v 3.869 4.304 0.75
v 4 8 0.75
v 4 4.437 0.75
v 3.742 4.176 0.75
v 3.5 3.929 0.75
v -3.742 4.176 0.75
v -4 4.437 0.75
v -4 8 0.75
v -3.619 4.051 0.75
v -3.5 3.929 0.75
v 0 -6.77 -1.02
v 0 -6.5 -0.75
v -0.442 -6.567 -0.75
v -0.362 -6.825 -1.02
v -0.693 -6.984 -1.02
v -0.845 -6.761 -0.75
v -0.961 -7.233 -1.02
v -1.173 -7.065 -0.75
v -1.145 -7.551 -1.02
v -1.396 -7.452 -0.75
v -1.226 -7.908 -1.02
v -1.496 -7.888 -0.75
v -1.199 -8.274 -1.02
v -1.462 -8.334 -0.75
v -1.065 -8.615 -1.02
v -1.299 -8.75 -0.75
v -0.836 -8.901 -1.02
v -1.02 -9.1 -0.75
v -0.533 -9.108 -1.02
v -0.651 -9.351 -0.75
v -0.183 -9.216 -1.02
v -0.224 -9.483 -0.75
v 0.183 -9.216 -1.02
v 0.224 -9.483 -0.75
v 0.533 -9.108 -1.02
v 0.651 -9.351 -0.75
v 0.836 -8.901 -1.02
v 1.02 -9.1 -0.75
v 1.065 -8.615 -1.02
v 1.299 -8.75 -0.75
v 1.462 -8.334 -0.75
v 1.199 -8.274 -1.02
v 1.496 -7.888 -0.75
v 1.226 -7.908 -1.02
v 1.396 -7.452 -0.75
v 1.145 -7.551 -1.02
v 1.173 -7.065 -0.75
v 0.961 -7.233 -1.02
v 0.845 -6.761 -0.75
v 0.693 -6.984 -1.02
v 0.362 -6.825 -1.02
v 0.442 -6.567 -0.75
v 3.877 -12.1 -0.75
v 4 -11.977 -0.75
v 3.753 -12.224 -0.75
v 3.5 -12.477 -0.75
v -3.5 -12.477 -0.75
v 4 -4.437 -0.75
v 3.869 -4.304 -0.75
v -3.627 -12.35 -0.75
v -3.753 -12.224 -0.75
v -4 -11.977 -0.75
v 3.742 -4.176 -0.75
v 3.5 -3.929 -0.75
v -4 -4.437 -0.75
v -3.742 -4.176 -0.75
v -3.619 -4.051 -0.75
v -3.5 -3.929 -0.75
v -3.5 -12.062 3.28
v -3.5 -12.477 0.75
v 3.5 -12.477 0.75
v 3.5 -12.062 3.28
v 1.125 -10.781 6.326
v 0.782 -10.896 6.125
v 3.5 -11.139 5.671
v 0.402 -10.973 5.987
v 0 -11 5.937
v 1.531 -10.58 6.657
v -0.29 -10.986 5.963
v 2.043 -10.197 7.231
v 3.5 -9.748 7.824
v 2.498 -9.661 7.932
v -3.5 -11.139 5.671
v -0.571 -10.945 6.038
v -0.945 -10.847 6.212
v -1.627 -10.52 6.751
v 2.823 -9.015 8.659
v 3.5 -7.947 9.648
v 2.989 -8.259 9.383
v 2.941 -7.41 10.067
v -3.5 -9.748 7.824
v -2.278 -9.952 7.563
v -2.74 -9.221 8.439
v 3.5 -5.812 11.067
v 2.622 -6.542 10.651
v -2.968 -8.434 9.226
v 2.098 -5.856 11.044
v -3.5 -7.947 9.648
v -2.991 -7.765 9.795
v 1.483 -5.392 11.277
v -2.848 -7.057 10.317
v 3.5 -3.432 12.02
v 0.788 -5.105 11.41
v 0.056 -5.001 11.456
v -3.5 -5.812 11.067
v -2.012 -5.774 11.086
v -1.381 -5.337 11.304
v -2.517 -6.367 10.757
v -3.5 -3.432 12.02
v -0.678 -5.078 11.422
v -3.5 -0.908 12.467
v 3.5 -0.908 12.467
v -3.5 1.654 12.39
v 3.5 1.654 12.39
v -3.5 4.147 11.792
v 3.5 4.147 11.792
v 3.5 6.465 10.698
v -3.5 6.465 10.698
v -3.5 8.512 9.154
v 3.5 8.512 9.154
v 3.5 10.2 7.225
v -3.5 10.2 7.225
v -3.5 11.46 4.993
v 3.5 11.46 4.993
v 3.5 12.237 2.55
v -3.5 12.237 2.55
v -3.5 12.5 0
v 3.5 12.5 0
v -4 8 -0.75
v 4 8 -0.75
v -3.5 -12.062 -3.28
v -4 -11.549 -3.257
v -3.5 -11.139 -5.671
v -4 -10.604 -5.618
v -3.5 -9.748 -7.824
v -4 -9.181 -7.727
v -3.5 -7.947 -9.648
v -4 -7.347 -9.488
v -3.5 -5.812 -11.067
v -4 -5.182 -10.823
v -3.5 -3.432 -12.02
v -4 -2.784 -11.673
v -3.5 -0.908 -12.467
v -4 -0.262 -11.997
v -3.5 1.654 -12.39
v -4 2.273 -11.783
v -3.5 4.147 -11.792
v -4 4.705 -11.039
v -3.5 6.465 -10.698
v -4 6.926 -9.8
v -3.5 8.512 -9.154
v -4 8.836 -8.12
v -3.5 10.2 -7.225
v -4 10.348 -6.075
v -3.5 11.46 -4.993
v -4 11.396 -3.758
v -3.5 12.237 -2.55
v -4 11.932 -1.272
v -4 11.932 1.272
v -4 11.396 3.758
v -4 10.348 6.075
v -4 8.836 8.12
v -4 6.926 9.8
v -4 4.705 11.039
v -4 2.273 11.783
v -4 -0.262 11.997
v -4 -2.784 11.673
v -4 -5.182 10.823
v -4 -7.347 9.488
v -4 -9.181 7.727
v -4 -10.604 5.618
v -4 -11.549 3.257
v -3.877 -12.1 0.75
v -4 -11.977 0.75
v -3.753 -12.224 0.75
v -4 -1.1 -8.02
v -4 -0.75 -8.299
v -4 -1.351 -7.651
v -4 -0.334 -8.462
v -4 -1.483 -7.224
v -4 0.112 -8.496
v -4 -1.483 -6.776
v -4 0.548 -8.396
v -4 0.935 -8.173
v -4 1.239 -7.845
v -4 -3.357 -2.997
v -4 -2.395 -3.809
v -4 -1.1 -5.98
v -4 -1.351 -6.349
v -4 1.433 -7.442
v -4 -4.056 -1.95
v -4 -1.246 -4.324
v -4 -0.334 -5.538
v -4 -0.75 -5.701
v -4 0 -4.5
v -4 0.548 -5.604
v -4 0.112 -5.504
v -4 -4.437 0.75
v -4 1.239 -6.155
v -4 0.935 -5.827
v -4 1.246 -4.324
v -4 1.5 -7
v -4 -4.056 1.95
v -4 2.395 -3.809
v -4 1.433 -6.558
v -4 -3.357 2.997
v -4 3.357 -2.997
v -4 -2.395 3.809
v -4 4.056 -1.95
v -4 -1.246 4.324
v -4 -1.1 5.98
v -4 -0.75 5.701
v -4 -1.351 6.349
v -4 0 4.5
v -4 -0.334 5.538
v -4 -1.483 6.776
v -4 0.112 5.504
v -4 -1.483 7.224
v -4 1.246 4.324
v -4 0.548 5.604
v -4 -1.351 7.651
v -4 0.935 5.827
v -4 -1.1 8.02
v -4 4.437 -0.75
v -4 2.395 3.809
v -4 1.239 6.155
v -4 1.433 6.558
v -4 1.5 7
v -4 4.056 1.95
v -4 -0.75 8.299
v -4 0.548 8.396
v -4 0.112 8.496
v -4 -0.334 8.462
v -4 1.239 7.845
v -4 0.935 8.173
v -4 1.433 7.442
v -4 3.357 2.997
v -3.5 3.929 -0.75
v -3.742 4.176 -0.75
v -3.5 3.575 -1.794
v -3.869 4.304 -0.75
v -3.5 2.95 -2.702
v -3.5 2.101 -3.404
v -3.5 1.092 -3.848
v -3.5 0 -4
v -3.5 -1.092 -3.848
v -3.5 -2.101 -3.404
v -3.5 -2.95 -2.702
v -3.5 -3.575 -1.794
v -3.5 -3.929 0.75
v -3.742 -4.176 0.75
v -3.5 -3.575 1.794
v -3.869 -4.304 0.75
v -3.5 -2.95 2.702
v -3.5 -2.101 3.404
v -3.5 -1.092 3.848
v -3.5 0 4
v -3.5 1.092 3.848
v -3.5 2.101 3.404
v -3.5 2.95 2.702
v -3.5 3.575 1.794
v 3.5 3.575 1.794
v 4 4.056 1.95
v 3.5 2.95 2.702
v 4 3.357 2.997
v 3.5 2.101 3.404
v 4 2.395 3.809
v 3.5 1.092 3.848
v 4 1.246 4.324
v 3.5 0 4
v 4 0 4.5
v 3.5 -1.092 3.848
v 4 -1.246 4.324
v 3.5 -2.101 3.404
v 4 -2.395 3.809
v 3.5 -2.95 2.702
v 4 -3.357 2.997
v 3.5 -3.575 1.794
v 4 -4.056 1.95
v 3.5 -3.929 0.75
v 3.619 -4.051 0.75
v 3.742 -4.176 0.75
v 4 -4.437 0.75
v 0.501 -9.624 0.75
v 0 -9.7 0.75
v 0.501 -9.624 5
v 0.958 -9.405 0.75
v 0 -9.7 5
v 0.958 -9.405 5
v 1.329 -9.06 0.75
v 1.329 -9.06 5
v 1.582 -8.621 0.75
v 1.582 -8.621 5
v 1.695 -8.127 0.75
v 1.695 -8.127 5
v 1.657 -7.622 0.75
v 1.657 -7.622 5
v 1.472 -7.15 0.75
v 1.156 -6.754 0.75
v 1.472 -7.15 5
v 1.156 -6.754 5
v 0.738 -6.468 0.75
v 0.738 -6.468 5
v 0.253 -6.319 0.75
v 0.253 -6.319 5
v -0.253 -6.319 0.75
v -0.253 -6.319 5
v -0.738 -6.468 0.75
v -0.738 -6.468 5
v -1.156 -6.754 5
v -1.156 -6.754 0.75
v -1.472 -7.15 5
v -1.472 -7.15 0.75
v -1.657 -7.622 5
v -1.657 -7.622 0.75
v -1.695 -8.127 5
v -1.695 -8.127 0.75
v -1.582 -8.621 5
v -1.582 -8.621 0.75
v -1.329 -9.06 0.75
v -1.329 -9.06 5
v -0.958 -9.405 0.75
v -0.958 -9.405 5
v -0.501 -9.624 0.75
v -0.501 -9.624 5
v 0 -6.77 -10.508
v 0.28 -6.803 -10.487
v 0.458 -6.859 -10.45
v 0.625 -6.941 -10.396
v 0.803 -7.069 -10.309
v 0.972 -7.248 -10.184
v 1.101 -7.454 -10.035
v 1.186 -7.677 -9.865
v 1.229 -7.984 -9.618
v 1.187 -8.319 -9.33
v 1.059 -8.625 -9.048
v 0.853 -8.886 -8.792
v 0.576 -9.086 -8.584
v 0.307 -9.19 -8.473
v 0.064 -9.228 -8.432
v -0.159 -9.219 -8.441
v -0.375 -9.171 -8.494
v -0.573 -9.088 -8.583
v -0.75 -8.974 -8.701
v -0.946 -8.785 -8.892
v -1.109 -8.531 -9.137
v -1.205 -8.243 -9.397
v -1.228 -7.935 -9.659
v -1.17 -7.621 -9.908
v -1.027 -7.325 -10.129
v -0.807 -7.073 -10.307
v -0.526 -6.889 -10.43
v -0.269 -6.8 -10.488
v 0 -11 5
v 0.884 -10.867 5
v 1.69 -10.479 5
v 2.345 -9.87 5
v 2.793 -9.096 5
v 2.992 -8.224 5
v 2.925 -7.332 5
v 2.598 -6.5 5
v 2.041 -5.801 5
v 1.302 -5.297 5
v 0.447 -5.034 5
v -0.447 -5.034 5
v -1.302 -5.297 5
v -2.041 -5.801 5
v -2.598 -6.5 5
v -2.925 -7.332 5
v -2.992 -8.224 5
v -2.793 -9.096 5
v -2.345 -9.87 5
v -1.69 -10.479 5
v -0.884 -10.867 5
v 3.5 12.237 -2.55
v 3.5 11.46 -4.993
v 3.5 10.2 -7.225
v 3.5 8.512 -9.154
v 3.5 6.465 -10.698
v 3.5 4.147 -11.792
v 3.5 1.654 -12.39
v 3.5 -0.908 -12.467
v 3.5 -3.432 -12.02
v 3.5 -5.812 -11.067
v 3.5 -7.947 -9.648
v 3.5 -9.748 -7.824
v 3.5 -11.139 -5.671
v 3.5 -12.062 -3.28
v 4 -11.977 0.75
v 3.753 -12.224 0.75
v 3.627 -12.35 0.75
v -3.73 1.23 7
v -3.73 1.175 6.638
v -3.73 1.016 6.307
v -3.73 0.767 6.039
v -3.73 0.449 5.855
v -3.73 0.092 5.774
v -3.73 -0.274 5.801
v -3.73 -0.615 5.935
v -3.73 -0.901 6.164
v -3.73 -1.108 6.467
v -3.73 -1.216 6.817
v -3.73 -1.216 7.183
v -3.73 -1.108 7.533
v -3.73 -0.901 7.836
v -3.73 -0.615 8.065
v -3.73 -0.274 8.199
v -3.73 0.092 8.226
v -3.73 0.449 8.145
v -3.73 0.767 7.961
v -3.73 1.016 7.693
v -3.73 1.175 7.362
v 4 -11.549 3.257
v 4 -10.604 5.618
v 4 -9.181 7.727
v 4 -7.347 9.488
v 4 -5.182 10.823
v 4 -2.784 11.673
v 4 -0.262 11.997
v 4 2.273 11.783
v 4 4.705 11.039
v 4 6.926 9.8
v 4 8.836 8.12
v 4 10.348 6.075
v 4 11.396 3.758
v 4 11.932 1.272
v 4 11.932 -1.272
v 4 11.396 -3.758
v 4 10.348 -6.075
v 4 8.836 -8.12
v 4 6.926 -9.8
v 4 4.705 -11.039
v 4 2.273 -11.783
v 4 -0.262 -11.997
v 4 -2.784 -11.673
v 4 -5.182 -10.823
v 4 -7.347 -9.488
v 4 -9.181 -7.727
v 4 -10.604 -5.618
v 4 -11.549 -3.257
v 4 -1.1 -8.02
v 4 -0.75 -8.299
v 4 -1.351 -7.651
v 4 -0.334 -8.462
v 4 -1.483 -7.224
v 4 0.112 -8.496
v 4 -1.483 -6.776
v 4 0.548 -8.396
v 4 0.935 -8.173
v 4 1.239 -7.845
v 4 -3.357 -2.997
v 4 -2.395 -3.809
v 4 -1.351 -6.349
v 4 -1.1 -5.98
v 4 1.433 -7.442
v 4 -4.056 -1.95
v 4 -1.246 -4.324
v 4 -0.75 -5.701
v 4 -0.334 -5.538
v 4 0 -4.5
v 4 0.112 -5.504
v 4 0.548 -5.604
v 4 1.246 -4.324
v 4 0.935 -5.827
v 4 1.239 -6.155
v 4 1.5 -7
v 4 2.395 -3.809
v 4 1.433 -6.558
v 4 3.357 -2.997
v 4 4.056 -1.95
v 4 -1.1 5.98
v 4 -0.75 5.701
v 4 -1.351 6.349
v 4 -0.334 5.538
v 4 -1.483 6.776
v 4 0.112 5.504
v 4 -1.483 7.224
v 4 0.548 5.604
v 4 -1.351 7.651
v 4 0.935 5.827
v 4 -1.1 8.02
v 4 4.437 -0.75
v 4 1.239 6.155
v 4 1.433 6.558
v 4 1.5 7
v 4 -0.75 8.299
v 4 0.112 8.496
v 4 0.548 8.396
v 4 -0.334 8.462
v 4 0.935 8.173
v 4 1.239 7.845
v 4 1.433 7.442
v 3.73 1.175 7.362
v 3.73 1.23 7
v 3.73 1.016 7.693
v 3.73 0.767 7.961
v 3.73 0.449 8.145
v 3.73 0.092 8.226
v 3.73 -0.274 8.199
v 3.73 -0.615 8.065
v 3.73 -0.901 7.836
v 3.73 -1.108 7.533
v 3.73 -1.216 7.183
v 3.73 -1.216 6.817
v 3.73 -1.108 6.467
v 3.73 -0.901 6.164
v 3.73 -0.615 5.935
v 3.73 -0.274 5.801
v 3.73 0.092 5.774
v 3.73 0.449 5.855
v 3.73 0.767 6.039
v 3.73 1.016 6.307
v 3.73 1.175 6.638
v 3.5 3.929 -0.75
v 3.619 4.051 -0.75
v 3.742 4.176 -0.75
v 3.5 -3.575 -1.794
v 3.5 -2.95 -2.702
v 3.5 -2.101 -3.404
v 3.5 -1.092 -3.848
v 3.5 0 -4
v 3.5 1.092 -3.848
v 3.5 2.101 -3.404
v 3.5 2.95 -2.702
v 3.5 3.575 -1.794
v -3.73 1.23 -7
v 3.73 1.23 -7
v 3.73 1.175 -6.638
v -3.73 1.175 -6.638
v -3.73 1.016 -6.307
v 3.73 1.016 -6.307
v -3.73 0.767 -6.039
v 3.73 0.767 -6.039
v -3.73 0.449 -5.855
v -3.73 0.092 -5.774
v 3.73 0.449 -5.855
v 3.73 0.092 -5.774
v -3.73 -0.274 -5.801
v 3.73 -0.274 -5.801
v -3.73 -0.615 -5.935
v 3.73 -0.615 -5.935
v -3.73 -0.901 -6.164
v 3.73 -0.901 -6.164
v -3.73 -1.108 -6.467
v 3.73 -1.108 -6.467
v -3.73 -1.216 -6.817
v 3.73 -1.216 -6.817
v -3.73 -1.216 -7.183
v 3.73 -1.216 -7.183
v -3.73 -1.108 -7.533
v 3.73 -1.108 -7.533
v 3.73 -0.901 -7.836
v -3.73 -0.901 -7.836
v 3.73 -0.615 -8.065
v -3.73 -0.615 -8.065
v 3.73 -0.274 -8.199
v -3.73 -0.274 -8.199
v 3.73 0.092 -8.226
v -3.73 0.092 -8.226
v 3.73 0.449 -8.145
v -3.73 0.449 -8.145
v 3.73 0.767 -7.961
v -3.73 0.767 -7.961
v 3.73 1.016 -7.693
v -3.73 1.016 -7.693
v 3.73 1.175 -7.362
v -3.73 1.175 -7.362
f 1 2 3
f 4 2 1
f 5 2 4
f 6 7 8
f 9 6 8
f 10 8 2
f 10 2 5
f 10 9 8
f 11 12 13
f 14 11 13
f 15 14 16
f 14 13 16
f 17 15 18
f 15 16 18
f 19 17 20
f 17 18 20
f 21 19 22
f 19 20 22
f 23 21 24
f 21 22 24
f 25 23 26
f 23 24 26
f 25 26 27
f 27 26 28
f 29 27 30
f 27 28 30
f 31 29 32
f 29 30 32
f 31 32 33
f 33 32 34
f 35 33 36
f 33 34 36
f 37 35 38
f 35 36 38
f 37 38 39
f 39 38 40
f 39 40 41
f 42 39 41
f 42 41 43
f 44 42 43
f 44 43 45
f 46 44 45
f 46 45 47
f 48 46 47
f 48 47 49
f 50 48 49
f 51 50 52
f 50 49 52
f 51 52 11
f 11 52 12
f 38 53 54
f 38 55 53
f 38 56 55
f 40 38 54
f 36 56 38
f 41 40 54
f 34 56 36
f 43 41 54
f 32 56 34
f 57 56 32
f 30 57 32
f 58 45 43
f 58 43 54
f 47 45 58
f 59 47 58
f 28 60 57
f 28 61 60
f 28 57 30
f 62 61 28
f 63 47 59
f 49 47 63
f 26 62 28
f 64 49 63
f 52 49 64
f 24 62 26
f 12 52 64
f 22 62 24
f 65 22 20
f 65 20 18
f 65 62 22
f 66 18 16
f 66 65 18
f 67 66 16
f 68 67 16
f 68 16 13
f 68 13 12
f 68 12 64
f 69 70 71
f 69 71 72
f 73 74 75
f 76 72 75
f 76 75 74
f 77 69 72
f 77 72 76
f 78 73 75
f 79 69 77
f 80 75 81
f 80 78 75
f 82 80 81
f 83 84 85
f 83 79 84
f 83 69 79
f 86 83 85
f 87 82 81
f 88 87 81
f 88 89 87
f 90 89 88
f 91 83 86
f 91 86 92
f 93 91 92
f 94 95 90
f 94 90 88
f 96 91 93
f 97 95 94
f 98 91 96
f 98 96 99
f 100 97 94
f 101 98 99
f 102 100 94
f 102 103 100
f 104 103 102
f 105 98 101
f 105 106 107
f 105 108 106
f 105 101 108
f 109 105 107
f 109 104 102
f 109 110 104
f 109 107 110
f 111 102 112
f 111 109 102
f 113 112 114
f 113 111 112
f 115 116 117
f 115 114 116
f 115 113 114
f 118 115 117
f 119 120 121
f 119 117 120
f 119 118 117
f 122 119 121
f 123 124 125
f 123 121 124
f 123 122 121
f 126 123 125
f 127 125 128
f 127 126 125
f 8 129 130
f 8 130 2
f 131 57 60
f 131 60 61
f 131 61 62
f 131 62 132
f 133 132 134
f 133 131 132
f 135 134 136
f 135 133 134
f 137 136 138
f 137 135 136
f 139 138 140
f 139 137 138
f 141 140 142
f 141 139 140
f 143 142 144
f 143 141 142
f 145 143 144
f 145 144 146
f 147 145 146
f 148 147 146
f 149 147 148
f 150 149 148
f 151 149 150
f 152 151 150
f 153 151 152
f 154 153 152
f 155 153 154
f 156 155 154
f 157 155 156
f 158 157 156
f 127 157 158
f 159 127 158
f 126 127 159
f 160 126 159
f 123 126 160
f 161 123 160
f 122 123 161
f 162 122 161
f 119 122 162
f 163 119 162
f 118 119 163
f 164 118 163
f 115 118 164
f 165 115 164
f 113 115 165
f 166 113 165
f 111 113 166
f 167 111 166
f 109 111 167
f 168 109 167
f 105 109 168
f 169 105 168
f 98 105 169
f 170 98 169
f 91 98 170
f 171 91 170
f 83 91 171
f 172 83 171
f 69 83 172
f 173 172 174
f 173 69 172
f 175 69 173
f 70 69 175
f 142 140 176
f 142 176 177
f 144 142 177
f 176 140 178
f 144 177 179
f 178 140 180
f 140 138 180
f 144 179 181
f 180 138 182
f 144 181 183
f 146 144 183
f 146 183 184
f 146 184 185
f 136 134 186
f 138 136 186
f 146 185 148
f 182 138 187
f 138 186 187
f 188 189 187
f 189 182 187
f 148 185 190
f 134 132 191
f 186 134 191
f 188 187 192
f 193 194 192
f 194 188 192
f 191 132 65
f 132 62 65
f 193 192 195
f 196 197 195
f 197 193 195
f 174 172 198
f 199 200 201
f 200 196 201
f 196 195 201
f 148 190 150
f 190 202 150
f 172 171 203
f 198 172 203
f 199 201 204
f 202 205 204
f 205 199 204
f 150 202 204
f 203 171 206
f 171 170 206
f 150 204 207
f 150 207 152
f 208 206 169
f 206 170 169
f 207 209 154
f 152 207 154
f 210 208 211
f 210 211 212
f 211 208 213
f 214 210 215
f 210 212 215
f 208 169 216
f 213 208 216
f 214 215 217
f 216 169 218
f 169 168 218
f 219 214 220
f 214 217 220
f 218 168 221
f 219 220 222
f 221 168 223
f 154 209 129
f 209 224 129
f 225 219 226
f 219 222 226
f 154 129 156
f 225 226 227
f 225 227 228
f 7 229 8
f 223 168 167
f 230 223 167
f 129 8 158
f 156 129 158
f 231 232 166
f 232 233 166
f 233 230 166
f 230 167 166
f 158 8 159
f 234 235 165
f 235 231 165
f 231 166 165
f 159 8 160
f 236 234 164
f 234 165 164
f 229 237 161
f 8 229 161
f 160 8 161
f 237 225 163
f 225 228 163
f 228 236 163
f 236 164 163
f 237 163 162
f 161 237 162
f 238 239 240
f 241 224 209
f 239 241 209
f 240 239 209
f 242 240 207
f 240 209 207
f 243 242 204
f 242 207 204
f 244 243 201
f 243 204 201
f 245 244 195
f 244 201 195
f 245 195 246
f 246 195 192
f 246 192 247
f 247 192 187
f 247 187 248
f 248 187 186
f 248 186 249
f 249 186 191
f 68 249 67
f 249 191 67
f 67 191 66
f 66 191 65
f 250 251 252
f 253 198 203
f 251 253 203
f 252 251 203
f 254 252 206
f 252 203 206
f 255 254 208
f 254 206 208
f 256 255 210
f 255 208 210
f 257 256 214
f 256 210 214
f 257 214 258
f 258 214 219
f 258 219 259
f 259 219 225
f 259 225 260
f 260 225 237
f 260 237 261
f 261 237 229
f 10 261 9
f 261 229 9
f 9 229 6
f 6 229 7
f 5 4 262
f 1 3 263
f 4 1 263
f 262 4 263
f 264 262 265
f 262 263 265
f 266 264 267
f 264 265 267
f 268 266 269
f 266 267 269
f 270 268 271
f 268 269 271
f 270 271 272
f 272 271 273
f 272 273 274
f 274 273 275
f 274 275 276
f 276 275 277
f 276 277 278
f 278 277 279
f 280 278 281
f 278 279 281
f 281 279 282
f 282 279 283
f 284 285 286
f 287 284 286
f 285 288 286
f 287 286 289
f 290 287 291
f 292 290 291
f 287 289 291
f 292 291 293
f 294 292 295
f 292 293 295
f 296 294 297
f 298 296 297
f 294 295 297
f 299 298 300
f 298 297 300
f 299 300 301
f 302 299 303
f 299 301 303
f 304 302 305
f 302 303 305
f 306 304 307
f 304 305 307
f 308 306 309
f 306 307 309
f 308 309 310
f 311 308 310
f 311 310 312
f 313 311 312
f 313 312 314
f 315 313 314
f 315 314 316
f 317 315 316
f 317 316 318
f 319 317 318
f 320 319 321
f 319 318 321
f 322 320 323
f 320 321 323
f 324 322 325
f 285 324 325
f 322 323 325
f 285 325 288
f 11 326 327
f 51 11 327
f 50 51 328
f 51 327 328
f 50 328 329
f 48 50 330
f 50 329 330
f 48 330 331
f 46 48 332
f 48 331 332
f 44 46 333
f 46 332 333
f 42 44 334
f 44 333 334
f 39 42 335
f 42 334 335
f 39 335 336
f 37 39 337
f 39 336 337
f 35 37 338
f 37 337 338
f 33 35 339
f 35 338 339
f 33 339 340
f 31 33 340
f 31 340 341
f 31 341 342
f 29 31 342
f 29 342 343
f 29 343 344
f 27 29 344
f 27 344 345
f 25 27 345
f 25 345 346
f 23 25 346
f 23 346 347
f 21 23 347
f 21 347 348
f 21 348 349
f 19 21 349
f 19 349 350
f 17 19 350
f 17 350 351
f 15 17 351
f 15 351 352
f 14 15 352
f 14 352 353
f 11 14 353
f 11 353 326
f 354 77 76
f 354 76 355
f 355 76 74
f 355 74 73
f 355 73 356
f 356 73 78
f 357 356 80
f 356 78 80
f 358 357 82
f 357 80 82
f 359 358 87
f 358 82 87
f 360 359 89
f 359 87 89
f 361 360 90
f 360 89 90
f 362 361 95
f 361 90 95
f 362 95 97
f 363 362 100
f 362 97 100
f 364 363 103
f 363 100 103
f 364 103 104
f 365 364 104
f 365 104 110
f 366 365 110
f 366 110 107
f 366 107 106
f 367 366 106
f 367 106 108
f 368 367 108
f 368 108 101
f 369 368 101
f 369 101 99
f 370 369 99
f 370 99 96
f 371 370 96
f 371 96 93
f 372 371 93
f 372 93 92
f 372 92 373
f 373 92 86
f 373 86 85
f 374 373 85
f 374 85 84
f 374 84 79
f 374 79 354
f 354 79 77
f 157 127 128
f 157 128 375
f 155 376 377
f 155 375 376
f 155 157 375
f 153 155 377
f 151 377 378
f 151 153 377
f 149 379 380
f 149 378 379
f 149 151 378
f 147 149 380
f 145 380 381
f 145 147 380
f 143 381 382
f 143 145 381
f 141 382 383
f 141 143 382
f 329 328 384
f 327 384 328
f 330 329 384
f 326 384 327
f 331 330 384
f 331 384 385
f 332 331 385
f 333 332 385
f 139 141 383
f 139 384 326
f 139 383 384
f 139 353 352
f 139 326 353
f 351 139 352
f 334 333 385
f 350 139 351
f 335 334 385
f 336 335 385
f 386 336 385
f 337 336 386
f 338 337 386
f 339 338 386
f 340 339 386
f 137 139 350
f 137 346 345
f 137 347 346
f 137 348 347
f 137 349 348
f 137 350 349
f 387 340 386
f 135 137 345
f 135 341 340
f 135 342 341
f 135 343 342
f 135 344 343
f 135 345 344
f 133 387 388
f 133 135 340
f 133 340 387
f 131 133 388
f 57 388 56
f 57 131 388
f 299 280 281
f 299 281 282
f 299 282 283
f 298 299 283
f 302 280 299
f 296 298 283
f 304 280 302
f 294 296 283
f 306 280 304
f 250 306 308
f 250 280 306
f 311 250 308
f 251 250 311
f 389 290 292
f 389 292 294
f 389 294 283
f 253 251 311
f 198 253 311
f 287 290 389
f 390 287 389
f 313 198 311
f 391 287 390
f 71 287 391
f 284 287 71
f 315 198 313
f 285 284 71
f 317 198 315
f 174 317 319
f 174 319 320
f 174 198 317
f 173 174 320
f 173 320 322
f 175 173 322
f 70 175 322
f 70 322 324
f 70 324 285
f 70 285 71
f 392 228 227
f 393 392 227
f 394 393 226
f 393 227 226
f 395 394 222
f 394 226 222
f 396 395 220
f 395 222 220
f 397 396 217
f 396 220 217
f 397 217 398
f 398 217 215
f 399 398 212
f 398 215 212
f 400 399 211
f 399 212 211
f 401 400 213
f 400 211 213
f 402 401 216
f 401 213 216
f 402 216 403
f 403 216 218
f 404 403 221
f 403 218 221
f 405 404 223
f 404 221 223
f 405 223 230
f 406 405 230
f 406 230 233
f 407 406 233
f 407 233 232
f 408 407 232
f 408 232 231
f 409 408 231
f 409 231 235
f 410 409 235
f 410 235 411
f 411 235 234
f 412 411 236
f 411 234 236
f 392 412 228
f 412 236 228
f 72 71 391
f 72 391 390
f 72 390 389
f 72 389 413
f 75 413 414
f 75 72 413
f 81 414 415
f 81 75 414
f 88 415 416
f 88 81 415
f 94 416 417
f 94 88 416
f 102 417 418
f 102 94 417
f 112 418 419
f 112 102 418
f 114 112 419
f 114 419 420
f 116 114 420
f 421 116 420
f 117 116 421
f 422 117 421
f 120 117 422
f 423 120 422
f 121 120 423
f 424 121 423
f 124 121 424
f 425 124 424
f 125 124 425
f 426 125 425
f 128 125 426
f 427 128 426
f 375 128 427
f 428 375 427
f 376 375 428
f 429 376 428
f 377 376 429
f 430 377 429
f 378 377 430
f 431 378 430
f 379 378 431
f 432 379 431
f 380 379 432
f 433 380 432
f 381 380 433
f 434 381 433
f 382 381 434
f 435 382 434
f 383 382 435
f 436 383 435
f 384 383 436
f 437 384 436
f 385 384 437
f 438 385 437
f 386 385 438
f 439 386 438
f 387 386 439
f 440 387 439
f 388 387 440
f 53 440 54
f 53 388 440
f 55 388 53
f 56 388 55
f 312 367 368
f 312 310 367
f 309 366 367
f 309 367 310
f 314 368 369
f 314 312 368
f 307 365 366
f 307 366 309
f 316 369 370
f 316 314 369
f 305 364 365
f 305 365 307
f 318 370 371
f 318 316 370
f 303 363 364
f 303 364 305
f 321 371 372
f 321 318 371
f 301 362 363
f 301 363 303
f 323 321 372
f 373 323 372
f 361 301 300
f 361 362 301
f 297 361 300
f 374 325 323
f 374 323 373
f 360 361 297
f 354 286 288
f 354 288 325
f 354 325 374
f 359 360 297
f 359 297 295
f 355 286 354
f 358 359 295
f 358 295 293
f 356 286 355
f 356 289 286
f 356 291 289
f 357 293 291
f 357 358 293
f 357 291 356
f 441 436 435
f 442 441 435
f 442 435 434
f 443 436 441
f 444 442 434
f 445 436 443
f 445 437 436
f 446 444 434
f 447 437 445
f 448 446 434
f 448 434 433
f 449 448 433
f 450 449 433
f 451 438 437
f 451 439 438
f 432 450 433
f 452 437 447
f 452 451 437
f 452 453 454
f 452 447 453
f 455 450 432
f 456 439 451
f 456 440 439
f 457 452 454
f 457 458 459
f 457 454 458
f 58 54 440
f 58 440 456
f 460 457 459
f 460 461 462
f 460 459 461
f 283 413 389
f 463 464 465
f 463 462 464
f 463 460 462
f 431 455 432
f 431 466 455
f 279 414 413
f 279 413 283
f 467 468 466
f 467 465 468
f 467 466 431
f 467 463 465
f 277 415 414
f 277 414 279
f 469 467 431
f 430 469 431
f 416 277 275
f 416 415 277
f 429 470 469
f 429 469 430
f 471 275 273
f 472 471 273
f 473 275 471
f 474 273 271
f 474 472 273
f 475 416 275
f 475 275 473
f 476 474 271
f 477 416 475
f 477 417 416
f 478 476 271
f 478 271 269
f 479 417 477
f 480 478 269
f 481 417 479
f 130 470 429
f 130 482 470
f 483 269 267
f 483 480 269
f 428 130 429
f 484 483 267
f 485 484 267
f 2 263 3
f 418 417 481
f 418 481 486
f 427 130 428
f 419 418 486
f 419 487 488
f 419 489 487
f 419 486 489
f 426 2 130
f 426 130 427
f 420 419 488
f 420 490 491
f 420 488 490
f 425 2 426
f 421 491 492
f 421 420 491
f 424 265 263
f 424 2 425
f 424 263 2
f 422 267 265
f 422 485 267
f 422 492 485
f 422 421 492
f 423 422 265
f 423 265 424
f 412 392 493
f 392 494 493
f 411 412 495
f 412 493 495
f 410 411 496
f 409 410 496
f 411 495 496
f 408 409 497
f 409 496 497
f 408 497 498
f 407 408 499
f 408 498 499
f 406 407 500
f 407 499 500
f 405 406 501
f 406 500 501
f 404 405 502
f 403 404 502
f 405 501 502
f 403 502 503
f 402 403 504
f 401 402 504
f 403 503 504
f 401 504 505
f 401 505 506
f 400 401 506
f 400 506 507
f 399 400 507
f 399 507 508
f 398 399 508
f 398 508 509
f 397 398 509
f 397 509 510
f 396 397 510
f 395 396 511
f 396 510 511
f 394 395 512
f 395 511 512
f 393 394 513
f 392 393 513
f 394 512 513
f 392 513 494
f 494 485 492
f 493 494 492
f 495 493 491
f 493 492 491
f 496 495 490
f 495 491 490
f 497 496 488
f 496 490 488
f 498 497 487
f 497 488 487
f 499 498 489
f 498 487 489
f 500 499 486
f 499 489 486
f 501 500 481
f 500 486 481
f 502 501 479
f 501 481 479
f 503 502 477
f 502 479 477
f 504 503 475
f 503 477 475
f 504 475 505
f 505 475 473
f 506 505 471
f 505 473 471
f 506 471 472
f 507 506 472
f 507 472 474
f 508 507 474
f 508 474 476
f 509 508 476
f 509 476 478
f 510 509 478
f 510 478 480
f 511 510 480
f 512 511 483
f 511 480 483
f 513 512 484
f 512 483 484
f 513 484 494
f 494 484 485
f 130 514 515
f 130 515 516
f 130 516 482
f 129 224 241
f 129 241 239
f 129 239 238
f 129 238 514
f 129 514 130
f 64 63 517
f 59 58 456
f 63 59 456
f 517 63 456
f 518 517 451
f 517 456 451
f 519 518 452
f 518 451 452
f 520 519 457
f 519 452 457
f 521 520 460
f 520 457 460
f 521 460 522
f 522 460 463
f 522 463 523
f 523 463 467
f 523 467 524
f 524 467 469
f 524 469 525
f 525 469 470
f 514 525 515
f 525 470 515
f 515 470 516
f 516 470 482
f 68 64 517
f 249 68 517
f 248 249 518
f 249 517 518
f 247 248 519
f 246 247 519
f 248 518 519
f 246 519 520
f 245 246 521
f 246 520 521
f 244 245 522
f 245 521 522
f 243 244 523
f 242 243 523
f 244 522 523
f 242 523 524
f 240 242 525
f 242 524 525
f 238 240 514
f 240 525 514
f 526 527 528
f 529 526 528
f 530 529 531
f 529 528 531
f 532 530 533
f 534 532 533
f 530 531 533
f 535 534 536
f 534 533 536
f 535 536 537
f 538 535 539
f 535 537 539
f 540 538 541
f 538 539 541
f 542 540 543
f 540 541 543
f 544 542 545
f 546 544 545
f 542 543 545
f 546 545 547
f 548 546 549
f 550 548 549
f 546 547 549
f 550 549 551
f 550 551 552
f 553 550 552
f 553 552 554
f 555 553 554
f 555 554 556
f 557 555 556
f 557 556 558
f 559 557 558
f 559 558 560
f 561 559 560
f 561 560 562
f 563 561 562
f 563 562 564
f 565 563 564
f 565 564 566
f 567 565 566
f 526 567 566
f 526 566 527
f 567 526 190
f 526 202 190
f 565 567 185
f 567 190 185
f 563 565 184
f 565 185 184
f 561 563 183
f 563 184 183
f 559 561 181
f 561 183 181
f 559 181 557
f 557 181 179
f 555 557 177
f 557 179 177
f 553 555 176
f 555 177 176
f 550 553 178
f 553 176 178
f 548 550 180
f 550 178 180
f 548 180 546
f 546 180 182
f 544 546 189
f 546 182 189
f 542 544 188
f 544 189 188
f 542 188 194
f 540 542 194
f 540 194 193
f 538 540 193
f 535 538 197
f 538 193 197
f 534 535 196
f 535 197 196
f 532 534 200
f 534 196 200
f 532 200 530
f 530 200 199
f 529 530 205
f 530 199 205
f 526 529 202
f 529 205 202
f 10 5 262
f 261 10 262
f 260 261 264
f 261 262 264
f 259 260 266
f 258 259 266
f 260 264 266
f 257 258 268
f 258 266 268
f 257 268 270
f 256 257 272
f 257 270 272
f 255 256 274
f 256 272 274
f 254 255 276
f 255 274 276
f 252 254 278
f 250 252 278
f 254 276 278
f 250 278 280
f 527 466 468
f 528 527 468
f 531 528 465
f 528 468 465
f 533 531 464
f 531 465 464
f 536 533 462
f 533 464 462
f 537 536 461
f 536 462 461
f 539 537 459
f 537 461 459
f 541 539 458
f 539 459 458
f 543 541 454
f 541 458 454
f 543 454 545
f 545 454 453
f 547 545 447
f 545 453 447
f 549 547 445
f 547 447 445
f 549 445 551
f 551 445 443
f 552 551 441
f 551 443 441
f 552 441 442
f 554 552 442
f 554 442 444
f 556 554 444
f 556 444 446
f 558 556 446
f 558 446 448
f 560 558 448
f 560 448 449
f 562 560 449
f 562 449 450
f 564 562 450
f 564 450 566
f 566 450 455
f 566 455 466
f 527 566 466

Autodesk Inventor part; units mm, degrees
sketch "Sketch_1" plane through (0, 0, 0) normal (0, 0, 1) x (1, 0, 0)
  line L0 (4, 0) -> (-4, 0)
  line L1 (-4, 12) -> (-4, 4.5)
  line L2 (-4, 4.5) -> (-3.5, 4)
  line L3 (-3.5, 4) -> (3.5, 4)
  line L4 (3.5, 4) -> (4, 4.5)
  line L5 (4, 4.5) -> (4, 12)
  line L6 (4, 12) -> (3.5, 12.5)
  line L7 (3.5, 12.5) -> (-3.5, 12.5)
  line L8 (-3.5, 12.5) -> (-4, 12)
revolve "Revolution1" add sketch "Sketch_1" angle 360 about axis through (4, 0, 0) along (1, 0, 0)
sketch "Sketch_2" plane through (0, 0, 0) normal (1, 0, 0) x (0, 1, 0)
  line L0 (-12.5, 0.75) -> (-12.5, -0.75)
  line L1 (-12.5, -0.75) -> (8, -0.75)
  line L2 (8, -0.75) -> (8, 0.75)
  line L3 (8, 0.75) -> (-12.5, 0.75)
extrude "Extrusion1" cut sketch "Sketch_2" along normal mid plane 8
sketch "Sketch_3" plane through (0, 0, 0) normal (1, 0, 0) x (0, 1, 0)
  line L0 (-8, 12.5) -> (-8, 0)
  line L1 (-8, 0) -> (-9.7, 0)
  line L2 (-9.7, 0) -> (-9.7, 5)
  line L3 (-9.7, 5) -> (-11, 5)
  line L4 (-11, 5) -> (-11, 12.5)
  line L5 (-11, 12.5) -> (-8, 12.5)
  line L6 (-8, 12.5) -> (-8, 0)
revolve "Revolution2" cut sketch "Sketch_3" angle 360 about axis through (0, -8, 12.5) along (0, 0, 1)
sketch "Sketch_4" plane through (0, 0, 0) normal (1, 0, 0) x (0, 1, 0)
  line L0 (-8, -12.75) -> (-8, -0.75)
  line L1 (-8, -0.75) -> (-6.5, -0.75)
  line L2 (-6.5, -0.75) -> (-6.7705, -1.0205)
  line L3 (-6.7705, -1.0205) -> (-6.7705, -12.75)
  line L4 (-6.7705, -12.75) -> (-8, -12.75)
  line L5 (-8, -12.75) -> (-8, -0.75)
revolve "Revolution3" cut sketch "Sketch_4" angle 360 about axis through (0, -8, -12.75) along (0, 0, -1)
thread "Thread1" size "M3x0.5" class "6H" standard "ISO Metric profile" length 9.6566
sketch "Sketch_7" plane through (0, 0, -7) normal (0, 0, 1) x (1, 0, 0)
  line L0 (4, 0) -> (-4, 0)
  line L1 (-4, 0) -> (-4, 1.5)
  line L2 (-4, 1.5) -> (-3.7295, 1.2295)
  line L3 (-3.7295, 1.2295) -> (3.7295, 1.2295)
  line L4 (3.7295, 1.2295) -> (4, 1.5)
  line L5 (4, 1.5) -> (4, 0)
  line L6 (4, 0) -> (-4, 0)
revolve "Revolution4" cut sketch "Sketch_7" angle 360 about axis through (4, 0, -7) along (1, 0, 0)
thread "Thread2" size "M3x0.5" class "6H" standard "ISO Metric profile" full length
sketch "Sketch_8" plane through (0, 0, 7) normal (0, 0, 1) x (1, 0, 0)
  line L0 (4, 0) -> (-4, 0)
  line L1 (-4, 0) -> (-4, 1.5)
  line L2 (-4, 1.5) -> (-3.7295, 1.2295)
  line L3 (-3.7295, 1.2295) -> (3.7295, 1.2295)
  line L4 (3.7295, 1.2295) -> (4, 1.5)
  line L5 (4, 1.5) -> (4, 0)
  line L6 (4, 0) -> (-4, 0)
revolve "Revolution5" cut sketch "Sketch_8" angle 360 about axis through (4, 0, 7) along (1, 0, 0)
thread "Thread3" size "M3x0.5" class "6H" standard "ISO Metric profile" full length
ref_plane "body_screw_XY" through (0, -8, 5) normal (0, 0, 1) x (1, 0, 0)
ref_plane "body_screw_YZ" through (0, -8, 5) normal (1, 0, 0) x (0, 1, 0)
ref_plane "body_screw_ZX" through (0, -8, 5) normal (0, 1, 0) x (0, 0, 1)
properties part number "SCSWA8-8b"
